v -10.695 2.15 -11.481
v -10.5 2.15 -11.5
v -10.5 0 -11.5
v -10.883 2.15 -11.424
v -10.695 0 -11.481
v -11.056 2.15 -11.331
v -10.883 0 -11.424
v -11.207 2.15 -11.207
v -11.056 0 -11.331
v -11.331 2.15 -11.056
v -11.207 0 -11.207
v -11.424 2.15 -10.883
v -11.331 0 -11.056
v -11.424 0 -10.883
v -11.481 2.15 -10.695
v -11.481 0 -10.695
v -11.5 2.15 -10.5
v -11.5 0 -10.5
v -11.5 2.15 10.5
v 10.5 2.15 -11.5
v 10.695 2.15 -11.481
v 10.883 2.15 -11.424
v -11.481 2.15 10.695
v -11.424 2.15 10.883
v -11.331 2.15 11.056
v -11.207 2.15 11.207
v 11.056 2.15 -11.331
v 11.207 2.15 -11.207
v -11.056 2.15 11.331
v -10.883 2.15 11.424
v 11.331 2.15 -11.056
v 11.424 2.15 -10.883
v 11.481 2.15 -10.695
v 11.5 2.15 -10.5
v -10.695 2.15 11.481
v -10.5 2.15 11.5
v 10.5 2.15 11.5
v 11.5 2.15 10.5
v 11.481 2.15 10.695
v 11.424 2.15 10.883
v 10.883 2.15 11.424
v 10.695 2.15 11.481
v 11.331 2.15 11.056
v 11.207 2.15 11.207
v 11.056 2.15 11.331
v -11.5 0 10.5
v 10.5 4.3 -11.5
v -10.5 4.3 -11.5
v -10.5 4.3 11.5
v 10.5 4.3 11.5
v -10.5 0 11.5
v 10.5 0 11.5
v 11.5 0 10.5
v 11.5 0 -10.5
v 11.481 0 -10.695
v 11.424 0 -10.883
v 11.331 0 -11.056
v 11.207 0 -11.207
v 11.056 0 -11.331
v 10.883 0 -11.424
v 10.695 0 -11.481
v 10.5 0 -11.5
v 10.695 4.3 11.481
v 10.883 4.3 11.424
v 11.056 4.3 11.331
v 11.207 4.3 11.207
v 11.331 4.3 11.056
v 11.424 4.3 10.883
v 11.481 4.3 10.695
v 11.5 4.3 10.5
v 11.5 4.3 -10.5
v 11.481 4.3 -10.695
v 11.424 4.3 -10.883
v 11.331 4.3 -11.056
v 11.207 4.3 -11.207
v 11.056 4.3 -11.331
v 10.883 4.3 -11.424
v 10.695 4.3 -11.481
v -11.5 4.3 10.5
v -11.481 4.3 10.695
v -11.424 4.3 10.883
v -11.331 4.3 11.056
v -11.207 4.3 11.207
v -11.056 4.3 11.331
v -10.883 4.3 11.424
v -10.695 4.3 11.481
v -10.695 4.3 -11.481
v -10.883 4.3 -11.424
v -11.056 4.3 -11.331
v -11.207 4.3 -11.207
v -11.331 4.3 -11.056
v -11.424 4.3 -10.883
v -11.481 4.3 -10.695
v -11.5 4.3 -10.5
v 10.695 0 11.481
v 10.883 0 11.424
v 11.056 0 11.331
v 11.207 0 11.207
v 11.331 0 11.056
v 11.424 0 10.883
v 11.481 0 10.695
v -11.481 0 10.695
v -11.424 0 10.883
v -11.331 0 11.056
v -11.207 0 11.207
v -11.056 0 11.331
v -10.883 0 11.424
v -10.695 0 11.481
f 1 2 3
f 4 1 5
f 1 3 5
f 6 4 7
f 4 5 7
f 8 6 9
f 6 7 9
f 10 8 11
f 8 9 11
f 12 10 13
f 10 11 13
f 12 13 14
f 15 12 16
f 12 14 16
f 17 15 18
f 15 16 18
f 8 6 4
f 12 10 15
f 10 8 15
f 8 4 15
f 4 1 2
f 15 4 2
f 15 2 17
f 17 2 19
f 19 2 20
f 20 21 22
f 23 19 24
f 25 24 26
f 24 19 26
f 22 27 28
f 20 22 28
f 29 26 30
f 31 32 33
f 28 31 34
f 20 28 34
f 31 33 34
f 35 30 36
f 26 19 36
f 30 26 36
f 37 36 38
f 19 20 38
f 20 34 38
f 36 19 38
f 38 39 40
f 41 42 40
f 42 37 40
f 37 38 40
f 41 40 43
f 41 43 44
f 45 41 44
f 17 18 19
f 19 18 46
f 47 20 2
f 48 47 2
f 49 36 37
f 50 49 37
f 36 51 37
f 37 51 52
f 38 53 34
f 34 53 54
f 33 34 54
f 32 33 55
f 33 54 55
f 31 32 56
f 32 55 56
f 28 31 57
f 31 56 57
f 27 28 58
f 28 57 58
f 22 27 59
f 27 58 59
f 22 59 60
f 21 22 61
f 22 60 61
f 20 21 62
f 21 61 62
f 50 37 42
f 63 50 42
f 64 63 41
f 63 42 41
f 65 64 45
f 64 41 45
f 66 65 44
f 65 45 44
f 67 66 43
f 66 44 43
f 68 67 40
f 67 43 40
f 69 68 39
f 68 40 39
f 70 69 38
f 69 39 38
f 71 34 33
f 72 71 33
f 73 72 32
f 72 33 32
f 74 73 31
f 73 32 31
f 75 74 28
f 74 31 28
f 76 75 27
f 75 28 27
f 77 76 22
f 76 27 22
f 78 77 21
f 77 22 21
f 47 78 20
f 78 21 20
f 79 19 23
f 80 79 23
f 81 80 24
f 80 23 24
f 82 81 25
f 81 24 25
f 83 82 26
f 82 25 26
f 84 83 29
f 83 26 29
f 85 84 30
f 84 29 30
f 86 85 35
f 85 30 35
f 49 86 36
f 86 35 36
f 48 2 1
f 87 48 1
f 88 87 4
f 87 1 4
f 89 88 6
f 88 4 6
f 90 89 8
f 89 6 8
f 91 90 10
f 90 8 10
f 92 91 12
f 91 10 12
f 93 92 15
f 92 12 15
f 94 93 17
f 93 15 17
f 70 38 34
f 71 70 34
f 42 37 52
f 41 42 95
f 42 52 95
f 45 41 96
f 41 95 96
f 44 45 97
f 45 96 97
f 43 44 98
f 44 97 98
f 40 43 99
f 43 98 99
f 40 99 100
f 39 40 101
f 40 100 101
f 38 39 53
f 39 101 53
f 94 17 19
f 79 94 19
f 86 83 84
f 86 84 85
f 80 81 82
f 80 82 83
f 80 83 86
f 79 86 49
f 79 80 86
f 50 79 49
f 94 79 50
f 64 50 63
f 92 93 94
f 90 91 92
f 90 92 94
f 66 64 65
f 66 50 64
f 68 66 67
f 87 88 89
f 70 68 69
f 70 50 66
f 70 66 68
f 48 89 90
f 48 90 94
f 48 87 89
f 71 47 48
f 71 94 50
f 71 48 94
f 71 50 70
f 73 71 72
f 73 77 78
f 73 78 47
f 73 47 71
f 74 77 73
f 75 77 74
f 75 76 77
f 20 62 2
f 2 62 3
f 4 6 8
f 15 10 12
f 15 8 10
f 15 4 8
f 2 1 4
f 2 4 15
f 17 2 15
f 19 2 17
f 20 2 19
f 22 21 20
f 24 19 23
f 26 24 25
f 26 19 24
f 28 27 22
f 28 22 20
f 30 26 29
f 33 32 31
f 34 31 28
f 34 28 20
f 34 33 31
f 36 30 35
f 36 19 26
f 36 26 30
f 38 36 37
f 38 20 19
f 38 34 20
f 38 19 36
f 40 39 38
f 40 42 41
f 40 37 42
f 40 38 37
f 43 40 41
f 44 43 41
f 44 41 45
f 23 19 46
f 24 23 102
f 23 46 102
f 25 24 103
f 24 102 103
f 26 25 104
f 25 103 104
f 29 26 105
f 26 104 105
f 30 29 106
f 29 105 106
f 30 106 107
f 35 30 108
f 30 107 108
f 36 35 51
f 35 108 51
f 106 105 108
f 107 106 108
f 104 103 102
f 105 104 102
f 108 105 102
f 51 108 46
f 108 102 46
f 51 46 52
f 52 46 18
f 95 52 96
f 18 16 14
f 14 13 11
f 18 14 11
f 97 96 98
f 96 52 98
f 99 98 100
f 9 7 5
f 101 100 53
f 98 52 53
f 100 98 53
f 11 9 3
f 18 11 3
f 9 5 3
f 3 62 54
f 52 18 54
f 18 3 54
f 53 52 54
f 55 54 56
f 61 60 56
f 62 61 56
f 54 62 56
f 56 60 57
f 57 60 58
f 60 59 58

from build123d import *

# Parameters (mm, degrees)
BOSS_EXTRUDE1_DEPTH = 4.3


with BuildPart() as part:
    # Sketch1 → Boss-Extrude1 (new body)
    with BuildSketch(Plane(origin=(0, 0, 0), x_dir=(1, 0, 0), z_dir=(0, 1, 0))):
        with BuildLine():
            Line((-10.5, -11.5), (10.5, -11.5))
            ThreePointArc((10.5, -11.5), (11.207106781, -11.207106781), (11.5, -10.5))
            Line((11.5, -10.5), (11.5, 10.5))
            ThreePointArc((11.5, 10.5), (11.207106781, 11.207106781), (10.5, 11.5))
            Line((10.5, 11.5), (-10.5, 11.5))
            ThreePointArc((-10.5, 11.5), (-11.207106781, 11.207106781), (-11.5, 10.5))
            Line((-11.5, 10.5), (-11.5, -10.5))
            ThreePointArc((-11.5, -10.5), (-11.207106781, -11.207106781), (-10.5, -11.5))
        make_face()
    extrude(amount=BOSS_EXTRUDE1_DEPTH)


with BuildPart() as body_2:
    # Split1: the piece on the far side of the plane
    add(part.part)
    split(bisect_by=Plane.ZX.offset(2.15), keep=Keep.BOTTOM)


with BuildPart() as part_1:
    add(part.part)

    # Split1
    split(bisect_by=Plane.ZX.offset(2.15), keep=Keep.TOP)


solid = Compound([body_2.part, part_1.part])
